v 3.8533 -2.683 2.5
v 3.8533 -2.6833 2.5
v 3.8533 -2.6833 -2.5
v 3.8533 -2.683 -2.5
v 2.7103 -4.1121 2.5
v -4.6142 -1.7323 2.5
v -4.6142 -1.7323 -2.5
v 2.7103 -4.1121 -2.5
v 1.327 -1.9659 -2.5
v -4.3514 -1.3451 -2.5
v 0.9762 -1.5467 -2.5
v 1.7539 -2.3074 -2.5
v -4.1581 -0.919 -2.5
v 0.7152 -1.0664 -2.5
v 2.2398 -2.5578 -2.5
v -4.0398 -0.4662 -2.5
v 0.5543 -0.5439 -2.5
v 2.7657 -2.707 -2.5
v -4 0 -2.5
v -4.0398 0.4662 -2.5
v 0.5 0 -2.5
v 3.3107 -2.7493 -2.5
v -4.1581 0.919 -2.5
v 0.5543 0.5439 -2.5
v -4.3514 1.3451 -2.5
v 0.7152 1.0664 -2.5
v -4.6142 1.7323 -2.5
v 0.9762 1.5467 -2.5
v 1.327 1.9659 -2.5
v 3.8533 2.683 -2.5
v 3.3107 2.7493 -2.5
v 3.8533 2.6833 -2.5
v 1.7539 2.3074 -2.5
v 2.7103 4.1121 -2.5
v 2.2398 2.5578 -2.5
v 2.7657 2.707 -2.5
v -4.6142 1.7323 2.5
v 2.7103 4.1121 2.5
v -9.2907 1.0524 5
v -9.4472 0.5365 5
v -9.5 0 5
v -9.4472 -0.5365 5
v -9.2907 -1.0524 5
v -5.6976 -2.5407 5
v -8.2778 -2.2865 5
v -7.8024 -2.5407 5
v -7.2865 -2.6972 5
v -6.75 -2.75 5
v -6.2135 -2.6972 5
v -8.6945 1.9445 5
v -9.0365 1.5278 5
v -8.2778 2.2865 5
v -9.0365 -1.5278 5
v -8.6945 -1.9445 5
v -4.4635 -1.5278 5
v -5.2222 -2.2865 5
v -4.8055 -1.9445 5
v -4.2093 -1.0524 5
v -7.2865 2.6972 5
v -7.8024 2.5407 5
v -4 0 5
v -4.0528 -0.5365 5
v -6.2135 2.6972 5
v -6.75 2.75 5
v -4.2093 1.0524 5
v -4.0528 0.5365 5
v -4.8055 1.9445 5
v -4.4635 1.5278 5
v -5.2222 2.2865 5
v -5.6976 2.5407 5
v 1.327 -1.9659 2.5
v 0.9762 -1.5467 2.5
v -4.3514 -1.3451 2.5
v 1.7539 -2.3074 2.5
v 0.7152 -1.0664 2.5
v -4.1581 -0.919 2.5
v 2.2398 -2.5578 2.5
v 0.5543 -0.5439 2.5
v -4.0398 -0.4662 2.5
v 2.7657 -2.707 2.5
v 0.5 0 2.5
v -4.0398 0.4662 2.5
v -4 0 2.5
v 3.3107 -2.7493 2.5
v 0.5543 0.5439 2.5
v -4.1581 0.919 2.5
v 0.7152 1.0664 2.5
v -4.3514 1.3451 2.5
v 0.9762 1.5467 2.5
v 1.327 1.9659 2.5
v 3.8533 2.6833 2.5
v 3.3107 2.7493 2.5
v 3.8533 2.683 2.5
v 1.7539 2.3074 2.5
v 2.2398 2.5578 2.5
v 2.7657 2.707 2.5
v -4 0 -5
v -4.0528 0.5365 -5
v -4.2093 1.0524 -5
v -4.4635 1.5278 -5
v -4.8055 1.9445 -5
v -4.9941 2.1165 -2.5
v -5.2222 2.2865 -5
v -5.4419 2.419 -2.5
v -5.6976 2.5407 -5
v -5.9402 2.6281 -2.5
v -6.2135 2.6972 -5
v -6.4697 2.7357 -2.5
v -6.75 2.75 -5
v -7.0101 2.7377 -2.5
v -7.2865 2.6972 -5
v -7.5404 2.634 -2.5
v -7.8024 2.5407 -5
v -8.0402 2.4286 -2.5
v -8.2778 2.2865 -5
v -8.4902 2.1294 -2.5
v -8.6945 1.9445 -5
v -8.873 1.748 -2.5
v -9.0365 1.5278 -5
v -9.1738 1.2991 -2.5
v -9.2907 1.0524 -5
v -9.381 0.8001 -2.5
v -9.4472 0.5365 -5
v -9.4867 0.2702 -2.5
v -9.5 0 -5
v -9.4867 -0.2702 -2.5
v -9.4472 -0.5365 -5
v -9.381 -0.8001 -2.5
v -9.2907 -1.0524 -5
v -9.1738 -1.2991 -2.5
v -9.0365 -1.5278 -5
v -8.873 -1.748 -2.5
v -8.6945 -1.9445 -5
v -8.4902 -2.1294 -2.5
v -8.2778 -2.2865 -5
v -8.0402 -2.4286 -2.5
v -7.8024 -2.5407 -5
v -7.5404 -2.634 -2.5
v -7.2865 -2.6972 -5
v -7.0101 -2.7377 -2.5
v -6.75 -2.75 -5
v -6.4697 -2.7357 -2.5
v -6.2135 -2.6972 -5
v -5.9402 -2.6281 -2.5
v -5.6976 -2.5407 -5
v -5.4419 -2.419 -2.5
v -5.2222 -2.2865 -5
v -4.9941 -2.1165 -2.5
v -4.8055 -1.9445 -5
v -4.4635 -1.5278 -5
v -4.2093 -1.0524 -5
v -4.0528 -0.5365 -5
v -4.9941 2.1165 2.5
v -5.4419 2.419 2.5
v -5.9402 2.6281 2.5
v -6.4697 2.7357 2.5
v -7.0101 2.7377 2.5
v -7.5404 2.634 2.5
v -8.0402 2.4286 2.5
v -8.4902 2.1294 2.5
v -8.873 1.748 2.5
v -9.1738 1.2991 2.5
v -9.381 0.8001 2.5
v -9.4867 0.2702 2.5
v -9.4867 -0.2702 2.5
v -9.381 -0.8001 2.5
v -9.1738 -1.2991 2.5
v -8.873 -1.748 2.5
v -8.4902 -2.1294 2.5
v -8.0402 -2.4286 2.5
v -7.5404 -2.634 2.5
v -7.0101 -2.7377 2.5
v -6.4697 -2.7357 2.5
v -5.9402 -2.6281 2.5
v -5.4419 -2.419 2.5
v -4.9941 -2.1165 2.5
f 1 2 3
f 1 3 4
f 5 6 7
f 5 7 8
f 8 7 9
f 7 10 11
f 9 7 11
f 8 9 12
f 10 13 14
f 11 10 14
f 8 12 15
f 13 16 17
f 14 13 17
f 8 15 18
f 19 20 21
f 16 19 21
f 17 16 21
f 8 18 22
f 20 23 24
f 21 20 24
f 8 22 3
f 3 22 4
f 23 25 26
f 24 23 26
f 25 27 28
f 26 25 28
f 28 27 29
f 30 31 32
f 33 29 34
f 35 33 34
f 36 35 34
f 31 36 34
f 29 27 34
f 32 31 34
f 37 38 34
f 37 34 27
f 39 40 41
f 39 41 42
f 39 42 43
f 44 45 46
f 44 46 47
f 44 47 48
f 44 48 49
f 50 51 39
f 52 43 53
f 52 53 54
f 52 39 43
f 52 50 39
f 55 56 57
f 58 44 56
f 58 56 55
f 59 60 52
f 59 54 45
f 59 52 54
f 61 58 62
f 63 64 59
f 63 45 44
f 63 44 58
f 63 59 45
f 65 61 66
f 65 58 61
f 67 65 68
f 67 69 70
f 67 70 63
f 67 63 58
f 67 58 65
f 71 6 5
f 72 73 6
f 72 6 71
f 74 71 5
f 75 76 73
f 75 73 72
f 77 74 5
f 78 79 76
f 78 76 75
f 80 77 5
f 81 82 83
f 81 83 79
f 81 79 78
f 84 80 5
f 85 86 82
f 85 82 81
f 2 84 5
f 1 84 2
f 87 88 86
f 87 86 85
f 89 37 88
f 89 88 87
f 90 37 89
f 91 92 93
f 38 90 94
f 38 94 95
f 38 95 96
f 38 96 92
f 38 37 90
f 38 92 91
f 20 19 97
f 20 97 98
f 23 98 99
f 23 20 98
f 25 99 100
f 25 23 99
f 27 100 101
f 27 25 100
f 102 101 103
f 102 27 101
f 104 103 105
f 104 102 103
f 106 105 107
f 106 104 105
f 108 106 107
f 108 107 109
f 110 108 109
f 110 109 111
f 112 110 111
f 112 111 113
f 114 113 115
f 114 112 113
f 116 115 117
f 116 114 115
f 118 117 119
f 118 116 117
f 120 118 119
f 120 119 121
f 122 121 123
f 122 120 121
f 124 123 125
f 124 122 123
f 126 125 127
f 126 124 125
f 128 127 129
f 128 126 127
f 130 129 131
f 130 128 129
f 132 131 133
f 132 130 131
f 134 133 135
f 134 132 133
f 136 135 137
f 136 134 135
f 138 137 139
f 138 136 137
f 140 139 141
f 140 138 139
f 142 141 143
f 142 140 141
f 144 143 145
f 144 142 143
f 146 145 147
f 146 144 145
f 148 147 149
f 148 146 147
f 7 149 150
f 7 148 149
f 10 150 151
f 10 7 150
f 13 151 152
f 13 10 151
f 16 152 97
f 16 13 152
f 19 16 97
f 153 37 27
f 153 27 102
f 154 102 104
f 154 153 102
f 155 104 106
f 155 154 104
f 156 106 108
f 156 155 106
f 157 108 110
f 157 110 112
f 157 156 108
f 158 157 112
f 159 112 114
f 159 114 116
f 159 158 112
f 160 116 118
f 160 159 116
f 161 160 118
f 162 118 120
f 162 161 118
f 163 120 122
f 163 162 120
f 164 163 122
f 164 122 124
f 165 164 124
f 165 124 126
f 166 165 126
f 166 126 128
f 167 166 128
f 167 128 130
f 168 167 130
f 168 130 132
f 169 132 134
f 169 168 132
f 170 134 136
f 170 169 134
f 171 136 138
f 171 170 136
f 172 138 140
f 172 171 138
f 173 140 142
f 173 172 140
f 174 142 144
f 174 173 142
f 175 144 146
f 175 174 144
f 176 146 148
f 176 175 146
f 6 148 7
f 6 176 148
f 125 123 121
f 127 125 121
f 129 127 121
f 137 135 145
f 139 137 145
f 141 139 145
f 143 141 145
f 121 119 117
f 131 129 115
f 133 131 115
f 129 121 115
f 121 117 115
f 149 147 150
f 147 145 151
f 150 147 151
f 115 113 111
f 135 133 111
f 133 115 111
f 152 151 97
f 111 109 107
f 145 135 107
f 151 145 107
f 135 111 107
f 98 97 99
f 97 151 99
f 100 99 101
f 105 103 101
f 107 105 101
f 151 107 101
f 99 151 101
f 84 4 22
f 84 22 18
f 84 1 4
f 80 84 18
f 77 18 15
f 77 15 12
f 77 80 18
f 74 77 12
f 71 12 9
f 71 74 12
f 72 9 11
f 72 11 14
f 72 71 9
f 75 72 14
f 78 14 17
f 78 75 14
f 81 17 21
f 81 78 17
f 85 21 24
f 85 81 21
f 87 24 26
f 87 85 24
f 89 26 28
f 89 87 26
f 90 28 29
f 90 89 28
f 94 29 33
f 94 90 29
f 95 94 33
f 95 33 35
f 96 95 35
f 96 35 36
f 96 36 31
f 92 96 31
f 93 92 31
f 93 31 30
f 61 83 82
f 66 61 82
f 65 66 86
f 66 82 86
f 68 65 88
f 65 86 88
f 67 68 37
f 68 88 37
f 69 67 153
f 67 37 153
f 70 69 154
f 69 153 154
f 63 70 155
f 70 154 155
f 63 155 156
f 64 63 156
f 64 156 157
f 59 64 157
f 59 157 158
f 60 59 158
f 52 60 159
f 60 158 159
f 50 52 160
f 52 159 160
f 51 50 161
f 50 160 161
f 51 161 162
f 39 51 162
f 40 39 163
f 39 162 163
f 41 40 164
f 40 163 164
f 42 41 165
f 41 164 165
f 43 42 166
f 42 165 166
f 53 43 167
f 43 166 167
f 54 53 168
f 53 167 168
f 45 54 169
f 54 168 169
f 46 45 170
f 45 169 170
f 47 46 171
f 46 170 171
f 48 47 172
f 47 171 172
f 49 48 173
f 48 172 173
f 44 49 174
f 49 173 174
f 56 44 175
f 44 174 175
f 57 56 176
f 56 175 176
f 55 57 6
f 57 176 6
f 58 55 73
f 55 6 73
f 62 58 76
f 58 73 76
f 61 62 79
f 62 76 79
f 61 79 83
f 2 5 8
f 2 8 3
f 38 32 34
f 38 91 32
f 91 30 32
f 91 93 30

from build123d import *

# Parameters (mm, degrees)
F1_DEPTH = 2.5
F2_R     = 2.75
F3_DEPTH = 2.5


# Not quite as in the source:
# - a pattern or mirror of a feature is missing from the dataset's text; its kind, count and spacing are read off the source's solid


with BuildPart() as f1:
    # F0 (on Top) → F1 (new body, symmetric)
    with BuildSketch(Plane.XY):
        with BuildLine():
            Line((3.853342479, 2.6833219012), (2.7102889432, 4.112138821))
            Line((2.7102889432, 4.112138821), (-4.6141804357, 1.7322744554))
            ThreePointArc((-4.6141804357, 1.7322744554), (-9.5, 0), (-4.6141804357, -1.7322744554))
            Line((-4.6141804357, -1.7322744554), (2.7102889432, -4.112138821))
            Line((2.7102889432, -4.112138821), (3.853342479, -2.6833219012))
            Line((3.853342479, -2.6833219012), (3.853342479, -2.6829979227))
            ThreePointArc((3.853342479, -2.6829979227), (0.5, 0), (3.853342479, 2.6829979227))
            Line((3.853342479, 2.6829979227), (3.853342479, 2.6833219012))
        make_face()
    extrude(amount=F1_DEPTH, both=True)

    # F2 (on face) → F3 (join)
    with BuildSketch(Plane.XY.offset(2.5)):
        with Locations((-6.75, 0)):
            Circle(F2_R)
    f3 = extrude(amount=F3_DEPTH)

    # F3_copies: F3 across plane
    add(f3.mirror(Plane(origin=(0, 0, 0), x_dir=(-1, 0, 0), z_dir=(0, 0, -1))))


solid = f1.part
